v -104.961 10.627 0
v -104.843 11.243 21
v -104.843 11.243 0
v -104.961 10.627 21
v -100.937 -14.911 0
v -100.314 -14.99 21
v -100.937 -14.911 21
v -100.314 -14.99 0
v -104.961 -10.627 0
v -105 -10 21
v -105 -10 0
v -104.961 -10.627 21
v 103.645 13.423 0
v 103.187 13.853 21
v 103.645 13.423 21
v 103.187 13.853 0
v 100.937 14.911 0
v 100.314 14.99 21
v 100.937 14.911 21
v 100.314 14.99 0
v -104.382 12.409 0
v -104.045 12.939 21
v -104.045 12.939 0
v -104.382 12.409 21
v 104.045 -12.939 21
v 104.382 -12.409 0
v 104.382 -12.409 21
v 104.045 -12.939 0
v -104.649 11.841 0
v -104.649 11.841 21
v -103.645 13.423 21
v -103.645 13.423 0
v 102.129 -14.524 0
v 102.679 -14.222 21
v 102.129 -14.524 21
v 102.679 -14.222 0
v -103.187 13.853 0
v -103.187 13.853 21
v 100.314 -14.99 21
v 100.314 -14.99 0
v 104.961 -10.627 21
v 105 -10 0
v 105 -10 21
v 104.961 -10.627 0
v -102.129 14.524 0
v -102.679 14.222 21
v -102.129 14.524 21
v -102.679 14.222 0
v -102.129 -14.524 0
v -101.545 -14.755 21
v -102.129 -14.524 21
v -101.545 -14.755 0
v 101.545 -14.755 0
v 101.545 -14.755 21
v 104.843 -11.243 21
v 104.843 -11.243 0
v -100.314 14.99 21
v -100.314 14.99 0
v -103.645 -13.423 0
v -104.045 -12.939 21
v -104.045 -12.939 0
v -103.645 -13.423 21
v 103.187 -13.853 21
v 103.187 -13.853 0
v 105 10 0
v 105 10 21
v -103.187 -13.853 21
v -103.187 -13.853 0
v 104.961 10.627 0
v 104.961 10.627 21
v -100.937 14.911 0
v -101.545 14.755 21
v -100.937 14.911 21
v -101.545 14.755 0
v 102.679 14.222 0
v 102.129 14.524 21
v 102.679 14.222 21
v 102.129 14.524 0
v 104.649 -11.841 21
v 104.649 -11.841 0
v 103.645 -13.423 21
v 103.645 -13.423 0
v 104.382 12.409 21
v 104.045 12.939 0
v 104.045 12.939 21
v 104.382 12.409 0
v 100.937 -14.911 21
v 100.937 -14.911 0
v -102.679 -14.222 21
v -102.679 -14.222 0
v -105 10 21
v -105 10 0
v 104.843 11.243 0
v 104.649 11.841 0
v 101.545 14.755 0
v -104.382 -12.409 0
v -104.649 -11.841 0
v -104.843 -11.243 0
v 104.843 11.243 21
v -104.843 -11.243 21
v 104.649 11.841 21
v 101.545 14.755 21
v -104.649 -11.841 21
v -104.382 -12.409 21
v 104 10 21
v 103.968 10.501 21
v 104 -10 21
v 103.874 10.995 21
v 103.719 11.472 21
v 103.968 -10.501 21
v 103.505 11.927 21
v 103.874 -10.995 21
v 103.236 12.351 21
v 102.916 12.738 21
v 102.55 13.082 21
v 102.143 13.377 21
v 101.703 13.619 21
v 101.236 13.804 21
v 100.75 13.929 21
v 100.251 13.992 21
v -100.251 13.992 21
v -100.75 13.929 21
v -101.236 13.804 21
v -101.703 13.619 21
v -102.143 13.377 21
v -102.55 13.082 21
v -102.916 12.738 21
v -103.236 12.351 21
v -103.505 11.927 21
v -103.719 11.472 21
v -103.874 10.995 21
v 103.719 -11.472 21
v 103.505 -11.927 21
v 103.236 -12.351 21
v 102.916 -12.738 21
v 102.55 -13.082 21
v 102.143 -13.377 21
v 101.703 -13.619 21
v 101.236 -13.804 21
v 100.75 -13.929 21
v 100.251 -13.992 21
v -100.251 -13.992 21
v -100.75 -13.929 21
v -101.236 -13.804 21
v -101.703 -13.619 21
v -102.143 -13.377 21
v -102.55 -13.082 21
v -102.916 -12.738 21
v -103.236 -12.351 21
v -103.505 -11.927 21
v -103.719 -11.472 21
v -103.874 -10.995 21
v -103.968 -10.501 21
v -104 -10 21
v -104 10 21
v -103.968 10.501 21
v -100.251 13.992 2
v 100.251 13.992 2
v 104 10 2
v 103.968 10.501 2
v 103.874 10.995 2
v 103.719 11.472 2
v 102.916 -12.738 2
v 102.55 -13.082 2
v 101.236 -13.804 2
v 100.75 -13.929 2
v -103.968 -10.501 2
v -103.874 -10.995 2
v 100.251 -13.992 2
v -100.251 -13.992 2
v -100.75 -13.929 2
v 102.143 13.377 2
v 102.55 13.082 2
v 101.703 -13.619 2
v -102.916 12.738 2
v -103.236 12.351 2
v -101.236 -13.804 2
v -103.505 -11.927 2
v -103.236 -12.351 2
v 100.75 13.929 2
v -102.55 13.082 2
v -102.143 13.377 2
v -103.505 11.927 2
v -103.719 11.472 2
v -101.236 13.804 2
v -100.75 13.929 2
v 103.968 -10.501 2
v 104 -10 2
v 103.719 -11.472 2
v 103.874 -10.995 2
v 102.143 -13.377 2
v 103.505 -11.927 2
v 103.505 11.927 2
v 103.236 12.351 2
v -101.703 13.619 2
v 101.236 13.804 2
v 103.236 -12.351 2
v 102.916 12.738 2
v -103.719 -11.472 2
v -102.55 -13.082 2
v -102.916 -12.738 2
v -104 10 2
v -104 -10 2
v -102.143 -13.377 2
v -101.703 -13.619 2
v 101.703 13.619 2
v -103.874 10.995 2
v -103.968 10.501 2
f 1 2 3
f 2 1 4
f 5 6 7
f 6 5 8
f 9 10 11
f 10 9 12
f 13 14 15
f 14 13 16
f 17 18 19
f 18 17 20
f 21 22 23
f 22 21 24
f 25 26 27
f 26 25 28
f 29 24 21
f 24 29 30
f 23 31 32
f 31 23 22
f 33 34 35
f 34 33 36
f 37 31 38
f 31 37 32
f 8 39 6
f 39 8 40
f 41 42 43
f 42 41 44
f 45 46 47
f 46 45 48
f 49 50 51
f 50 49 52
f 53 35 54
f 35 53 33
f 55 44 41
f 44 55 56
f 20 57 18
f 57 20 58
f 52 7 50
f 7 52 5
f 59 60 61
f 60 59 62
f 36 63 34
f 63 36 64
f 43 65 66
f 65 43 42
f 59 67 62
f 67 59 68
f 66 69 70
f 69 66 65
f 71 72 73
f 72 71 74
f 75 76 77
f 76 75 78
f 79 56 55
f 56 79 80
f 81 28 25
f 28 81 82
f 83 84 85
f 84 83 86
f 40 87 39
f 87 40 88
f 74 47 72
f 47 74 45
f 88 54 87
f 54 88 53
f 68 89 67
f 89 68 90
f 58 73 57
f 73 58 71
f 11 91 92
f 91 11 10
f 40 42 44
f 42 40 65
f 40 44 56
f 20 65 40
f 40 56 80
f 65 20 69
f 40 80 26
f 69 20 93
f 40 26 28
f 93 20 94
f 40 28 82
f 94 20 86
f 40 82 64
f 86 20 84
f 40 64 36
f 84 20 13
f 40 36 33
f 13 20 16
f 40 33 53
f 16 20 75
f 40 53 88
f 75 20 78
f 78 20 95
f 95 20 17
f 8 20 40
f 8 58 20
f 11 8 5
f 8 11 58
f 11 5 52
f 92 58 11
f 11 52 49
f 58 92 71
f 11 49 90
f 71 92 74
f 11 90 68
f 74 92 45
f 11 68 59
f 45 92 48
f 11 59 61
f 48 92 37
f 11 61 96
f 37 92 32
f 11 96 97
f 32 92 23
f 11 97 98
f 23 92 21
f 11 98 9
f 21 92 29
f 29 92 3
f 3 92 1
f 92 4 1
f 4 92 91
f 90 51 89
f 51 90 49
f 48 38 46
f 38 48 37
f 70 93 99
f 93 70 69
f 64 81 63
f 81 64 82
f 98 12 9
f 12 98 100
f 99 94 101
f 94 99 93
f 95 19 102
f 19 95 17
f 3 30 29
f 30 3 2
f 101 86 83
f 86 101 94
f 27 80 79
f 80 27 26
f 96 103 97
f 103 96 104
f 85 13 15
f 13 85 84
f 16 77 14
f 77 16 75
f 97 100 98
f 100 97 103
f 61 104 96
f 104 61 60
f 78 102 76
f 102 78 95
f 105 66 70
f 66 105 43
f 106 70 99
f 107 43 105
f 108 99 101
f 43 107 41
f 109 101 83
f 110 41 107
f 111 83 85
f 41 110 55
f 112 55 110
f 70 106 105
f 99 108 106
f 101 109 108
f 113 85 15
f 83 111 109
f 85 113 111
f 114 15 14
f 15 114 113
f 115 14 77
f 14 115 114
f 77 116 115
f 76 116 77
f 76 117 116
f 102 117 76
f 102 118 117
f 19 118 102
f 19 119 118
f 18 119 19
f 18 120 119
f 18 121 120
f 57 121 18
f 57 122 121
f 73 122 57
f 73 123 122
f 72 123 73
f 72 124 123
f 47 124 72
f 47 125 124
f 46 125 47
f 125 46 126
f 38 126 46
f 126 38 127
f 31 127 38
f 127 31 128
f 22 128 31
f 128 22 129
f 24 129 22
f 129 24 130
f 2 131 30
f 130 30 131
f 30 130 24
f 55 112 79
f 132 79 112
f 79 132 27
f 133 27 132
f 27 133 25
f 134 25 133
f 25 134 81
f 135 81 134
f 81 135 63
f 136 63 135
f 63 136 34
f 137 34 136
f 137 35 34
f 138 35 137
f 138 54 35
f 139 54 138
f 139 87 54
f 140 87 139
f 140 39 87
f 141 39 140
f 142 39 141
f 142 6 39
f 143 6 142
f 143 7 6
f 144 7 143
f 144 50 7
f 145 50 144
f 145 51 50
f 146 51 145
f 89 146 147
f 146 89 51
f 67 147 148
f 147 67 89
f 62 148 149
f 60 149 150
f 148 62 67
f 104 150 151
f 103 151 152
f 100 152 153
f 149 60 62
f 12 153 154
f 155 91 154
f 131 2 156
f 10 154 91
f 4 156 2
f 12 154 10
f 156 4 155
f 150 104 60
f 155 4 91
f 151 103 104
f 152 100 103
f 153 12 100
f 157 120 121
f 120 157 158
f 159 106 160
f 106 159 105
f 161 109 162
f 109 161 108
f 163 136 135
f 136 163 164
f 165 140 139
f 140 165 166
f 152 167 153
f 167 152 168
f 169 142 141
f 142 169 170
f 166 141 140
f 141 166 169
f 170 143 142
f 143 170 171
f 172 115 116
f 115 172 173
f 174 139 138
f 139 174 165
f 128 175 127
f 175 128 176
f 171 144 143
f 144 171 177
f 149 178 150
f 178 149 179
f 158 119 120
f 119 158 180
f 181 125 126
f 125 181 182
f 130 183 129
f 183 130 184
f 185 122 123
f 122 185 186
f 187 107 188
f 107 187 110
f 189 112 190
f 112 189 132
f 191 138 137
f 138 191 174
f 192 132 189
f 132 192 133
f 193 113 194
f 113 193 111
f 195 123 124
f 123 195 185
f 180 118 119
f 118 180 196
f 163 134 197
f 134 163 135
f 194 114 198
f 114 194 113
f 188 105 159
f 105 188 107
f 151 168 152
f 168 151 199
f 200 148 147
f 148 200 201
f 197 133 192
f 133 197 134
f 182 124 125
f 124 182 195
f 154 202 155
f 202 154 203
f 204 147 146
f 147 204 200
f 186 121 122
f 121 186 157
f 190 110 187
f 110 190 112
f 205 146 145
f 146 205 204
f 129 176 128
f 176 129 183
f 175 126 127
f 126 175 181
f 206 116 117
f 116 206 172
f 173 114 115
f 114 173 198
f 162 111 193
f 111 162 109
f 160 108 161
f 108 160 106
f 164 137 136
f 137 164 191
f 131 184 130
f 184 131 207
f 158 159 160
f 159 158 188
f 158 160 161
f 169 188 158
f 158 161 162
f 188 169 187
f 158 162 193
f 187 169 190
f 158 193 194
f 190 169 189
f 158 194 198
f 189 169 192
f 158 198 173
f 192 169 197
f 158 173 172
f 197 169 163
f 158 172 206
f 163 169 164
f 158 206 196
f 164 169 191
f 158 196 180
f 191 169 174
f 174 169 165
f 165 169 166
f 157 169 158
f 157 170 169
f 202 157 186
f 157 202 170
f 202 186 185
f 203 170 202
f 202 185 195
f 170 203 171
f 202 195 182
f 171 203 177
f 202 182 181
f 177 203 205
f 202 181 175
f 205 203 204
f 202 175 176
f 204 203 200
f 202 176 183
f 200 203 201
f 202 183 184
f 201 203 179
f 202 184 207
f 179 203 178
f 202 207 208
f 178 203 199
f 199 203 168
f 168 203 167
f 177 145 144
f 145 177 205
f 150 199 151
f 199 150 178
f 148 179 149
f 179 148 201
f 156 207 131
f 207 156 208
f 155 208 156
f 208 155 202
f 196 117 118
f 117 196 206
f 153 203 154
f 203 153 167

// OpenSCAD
$fn = 50;


difference() {
	union() {
		hull() {
			translate(v = [-100.0000000000, 10.0000000000, 0]) {
				cylinder(h = 21, r = 5);
			}
			translate(v = [100.0000000000, 10.0000000000, 0]) {
				cylinder(h = 21, r = 5);
			}
			translate(v = [-100.0000000000, -10.0000000000, 0]) {
				cylinder(h = 21, r = 5);
			}
			translate(v = [100.0000000000, -10.0000000000, 0]) {
				cylinder(h = 21, r = 5);
			}
		}
	}
	union() {
		translate(v = [0, 0, 2]) {
			hull() {
				translate(v = [-100.0000000000, 10.0000000000, 0]) {
					cylinder(h = 19, r = 4);
				}
				translate(v = [100.0000000000, 10.0000000000, 0]) {
					cylinder(h = 19, r = 4);
				}
				translate(v = [-100.0000000000, -10.0000000000, 0]) {
					cylinder(h = 19, r = 4);
				}
				translate(v = [100.0000000000, -10.0000000000, 0]) {
					cylinder(h = 19, r = 4);
				}
			}
		}
	}
}
